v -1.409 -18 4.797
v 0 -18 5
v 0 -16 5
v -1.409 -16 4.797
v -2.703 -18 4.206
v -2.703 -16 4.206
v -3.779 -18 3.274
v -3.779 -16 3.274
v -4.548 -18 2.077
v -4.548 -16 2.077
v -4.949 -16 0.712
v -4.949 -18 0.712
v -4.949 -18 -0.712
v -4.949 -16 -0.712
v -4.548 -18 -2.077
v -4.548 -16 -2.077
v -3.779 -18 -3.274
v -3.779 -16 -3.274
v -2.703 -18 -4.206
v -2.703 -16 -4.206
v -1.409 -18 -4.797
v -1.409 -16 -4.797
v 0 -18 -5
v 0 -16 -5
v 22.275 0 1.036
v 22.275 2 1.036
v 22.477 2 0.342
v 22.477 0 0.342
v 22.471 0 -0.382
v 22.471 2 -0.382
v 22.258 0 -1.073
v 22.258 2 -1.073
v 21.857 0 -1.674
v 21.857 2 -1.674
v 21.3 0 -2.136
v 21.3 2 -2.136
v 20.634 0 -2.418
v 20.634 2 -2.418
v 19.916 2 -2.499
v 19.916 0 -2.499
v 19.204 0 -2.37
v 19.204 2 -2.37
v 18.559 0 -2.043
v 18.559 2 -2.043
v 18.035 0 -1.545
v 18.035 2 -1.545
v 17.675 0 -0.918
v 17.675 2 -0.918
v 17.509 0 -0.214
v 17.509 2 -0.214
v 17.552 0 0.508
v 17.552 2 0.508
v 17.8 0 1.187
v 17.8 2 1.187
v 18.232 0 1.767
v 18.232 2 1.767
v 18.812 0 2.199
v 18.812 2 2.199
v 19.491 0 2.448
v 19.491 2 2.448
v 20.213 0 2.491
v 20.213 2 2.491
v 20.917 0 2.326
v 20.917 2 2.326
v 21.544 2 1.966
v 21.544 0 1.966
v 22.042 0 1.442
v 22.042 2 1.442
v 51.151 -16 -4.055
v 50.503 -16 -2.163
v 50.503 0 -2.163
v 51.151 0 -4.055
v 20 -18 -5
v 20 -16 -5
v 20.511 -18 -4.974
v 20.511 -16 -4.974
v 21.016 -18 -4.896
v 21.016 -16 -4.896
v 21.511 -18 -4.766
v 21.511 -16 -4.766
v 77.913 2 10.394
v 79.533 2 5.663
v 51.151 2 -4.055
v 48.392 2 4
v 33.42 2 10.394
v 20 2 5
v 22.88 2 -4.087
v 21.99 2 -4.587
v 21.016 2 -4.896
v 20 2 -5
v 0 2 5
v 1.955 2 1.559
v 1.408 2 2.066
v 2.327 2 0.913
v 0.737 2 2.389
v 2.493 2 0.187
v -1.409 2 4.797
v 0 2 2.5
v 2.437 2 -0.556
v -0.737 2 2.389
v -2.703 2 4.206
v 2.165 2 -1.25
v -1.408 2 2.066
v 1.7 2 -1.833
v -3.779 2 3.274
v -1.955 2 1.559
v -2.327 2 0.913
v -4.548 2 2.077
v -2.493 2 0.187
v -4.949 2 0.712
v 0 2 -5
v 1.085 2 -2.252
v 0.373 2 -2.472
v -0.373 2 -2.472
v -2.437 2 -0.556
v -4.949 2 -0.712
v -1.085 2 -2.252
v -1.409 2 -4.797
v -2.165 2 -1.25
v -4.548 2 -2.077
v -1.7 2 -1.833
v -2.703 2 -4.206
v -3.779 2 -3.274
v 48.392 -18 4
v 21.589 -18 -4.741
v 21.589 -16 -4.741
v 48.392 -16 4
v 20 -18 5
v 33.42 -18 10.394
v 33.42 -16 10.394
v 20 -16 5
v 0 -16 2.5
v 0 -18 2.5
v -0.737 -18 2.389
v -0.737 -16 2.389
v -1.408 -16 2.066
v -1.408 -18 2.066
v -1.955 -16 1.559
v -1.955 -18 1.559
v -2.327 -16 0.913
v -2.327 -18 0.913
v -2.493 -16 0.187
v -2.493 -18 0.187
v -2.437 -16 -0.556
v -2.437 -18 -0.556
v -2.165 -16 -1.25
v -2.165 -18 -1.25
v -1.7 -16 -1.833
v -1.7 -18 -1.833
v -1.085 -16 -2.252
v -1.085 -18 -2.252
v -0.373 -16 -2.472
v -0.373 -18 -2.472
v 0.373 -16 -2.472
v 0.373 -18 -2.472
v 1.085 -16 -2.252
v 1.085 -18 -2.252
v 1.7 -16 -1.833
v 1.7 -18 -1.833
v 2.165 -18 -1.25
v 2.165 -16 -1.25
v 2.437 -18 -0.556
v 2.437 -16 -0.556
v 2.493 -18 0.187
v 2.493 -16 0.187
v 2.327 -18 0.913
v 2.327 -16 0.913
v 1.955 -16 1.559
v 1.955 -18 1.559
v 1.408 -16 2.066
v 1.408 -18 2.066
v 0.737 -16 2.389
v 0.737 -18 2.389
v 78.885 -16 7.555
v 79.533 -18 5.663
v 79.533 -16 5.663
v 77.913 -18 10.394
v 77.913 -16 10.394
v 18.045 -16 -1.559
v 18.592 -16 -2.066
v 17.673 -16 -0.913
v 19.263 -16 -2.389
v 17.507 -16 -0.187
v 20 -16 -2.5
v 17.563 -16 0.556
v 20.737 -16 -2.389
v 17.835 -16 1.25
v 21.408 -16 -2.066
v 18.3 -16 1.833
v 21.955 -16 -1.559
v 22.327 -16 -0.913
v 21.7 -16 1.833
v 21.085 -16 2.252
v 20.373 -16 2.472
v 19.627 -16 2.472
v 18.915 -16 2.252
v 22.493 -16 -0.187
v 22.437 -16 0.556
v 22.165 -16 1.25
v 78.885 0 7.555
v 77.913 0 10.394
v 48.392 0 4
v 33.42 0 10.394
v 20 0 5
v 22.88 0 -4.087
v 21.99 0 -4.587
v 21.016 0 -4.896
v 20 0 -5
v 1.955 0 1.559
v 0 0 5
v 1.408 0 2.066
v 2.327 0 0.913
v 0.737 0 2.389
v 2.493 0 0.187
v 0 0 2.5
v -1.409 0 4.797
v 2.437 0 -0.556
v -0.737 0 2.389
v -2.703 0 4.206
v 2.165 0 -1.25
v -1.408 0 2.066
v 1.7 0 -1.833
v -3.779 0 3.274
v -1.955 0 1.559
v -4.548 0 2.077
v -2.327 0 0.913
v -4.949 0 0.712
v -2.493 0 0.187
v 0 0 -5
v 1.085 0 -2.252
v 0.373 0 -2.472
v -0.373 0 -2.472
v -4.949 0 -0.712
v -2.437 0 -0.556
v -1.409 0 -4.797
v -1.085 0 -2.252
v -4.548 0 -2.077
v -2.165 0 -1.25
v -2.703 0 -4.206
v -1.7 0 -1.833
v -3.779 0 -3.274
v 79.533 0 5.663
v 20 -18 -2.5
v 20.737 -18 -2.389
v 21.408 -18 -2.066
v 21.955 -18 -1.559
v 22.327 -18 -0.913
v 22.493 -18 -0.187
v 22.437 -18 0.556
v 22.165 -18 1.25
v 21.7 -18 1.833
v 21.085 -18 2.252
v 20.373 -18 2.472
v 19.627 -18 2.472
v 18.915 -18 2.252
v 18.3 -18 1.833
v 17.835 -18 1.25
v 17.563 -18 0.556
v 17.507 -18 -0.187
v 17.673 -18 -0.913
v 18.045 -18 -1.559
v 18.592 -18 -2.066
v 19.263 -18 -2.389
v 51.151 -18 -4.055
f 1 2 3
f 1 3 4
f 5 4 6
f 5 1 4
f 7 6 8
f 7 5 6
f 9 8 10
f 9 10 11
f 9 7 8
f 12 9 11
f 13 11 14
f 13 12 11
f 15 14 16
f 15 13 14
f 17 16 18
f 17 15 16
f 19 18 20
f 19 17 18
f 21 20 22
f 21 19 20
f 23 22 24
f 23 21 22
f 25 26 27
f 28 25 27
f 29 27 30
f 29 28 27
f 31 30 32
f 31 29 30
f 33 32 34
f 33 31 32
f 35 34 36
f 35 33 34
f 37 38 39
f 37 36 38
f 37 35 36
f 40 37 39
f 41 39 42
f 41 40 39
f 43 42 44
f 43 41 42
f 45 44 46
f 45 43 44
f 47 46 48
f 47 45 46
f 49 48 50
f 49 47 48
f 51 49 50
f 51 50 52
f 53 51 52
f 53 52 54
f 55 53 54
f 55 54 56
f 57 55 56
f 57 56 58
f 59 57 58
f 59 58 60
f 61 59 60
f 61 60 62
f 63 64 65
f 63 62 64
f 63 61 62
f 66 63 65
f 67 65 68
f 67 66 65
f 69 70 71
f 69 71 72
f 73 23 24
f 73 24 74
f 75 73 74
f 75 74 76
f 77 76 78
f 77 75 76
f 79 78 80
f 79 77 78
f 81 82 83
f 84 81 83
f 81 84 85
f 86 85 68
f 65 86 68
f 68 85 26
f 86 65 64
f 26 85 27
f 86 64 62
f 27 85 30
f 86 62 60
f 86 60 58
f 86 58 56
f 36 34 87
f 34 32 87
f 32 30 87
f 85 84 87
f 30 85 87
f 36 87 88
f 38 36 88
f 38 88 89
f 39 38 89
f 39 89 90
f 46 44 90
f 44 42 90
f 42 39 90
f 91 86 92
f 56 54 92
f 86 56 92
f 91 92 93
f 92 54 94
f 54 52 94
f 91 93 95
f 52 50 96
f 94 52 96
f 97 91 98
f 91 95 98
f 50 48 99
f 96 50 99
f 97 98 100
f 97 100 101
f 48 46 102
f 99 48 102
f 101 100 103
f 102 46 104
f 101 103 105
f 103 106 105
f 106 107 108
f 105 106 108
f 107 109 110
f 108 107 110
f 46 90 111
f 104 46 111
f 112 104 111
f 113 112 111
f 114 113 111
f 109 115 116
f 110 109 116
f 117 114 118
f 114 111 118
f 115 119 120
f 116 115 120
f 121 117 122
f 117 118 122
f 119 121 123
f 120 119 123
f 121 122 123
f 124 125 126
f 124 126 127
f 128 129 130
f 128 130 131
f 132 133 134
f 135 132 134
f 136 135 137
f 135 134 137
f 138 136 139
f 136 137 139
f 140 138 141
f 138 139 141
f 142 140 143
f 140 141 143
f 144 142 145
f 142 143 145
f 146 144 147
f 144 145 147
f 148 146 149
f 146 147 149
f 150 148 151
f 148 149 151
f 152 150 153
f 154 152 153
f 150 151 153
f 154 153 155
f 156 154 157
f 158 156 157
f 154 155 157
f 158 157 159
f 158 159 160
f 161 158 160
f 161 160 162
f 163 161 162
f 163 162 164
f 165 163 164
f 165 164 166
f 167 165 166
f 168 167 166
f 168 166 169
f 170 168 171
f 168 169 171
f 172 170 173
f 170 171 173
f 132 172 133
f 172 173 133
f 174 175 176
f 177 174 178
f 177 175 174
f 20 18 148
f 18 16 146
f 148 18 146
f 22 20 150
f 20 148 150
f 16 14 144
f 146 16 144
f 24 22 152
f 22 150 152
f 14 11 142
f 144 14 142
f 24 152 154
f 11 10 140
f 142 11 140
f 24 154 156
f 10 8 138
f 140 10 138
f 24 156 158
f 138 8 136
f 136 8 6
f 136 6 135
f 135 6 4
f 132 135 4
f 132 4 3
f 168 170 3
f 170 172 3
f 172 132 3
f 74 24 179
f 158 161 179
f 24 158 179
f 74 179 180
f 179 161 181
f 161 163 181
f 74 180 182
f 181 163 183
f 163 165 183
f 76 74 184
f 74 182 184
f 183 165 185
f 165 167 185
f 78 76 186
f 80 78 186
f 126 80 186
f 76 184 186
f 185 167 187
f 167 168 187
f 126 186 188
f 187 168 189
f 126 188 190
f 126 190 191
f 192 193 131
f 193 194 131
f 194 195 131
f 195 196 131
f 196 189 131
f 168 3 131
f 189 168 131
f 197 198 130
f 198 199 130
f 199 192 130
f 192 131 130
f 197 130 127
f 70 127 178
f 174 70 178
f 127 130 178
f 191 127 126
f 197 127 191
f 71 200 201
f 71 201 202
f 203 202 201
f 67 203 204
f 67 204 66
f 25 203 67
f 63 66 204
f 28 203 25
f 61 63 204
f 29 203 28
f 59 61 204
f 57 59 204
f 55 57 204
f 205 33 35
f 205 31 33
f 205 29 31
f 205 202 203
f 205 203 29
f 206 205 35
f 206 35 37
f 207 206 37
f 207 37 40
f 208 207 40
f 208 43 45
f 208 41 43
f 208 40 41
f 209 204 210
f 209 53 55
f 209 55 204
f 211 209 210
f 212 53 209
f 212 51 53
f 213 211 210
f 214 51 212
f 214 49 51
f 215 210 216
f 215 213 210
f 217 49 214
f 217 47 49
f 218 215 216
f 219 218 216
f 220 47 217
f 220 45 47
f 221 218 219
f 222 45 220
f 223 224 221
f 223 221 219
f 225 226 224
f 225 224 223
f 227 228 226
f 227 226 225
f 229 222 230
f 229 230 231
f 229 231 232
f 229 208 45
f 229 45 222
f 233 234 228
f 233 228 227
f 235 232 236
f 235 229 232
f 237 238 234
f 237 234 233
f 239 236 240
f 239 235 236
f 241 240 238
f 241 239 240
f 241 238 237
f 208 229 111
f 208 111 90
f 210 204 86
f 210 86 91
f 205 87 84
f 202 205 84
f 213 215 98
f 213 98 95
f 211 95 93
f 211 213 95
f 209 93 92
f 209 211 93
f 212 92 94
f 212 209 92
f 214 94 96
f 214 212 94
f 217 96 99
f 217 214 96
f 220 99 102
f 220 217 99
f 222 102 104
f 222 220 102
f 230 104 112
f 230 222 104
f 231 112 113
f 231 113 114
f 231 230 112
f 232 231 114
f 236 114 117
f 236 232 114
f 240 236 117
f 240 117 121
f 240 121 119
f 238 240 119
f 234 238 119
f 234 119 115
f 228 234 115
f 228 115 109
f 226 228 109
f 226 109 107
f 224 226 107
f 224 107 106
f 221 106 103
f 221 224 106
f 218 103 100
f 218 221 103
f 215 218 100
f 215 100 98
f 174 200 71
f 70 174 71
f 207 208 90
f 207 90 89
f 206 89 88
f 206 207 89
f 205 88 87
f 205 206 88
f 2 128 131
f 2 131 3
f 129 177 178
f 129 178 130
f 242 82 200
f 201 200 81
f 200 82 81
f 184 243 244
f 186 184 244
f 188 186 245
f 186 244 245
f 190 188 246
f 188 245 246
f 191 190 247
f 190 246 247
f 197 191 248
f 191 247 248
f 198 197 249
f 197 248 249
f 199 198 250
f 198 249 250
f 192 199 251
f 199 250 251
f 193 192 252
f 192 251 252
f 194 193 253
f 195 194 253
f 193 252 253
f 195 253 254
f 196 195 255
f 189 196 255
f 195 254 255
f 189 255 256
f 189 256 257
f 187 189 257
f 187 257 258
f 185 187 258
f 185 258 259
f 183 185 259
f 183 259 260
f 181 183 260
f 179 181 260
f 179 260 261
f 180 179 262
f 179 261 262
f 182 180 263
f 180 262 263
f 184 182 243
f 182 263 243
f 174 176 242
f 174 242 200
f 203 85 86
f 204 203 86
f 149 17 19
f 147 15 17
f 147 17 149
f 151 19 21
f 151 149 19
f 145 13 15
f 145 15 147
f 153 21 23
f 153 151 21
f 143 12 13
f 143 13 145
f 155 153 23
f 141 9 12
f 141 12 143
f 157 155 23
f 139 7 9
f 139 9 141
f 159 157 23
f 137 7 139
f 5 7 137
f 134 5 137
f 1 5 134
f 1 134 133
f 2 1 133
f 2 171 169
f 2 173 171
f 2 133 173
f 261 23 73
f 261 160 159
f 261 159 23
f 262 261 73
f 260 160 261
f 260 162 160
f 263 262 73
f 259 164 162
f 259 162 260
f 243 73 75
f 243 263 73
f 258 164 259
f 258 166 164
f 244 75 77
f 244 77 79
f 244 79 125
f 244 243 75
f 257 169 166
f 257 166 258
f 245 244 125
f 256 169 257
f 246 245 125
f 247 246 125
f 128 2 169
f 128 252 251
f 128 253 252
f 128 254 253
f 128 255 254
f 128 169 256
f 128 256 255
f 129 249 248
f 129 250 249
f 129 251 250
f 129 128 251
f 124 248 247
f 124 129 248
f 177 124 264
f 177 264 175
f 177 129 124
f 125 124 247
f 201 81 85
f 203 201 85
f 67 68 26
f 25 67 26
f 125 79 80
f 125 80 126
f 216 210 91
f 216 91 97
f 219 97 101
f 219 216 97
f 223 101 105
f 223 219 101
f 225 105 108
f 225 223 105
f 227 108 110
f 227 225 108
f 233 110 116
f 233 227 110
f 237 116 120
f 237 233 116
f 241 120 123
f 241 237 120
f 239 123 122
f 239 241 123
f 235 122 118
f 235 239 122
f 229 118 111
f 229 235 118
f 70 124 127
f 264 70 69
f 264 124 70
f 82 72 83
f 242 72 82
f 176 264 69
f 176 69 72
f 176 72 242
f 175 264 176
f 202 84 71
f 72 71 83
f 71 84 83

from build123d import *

# Parameters (mm, degrees)
SKETCH1_R           = 2.5
BOSS_EXTRUDE1_DEPTH = 2
BOSS_EXTRUDE2_DEPTH = 2
BOSS_EXTRUDE3_DEPTH = 16
BOSS_EXTRUDE4_START = 2
SKETCH5_R           = 2.5
BOSS_EXTRUDE4_DEPTH = 2


with BuildPart() as part:
    # Sketch1 → Boss-Extrude1 (new body)
    with BuildSketch(Plane(origin=(0, 0, 0), x_dir=(1, 0, 0), z_dir=(0, 1, 0))):
        with BuildLine():
            Line((0, 5), (20, 5))
            ThreePointArc((20, 5), (25, 0), (20, -5))
            Line((20, -5), (0, -5))
            ThreePointArc((0, -5), (-5, 0), (0, 5))
        make_face()
        with Locations(Location((0, 0, 0), (0, 0, 270))):
            Circle(SKETCH1_R, mode=Mode.SUBTRACT)
        with Locations(Location((20, 0, 0), (0, 0, 270))):
            Circle(SKETCH1_R, mode=Mode.SUBTRACT)
    extrude(amount=BOSS_EXTRUDE1_DEPTH)

    # Sketch3 → Boss-Extrude2 (add)
    with BuildSketch(Plane(origin=(0, 2, 0), x_dir=(1, 0, 0), z_dir=(0, 1, 0))):
        Polygon((20, 5), (48.392339972, -4.000005434), (51.150724408, 4.055463463), (79.532873786, -5.663260562), (77.913086448, -10.393618791), (33.419519193, -10.393618791), (20, -5), (24.317409575, 2.521898999), align=None)
    extrude(amount=-BOSS_EXTRUDE2_DEPTH)

    # Sketch4 → Boss-Extrude3 (add)
    with BuildSketch(Plane.XZ):
        Polygon((51.150724408, -4.055463463), (79.532873786, 5.663260562), (78.884958851, 7.555403854), (50.502809473, -2.163320171), align=None)
    extrude(amount=BOSS_EXTRUDE3_DEPTH)

    # Sketch5 → Boss-Extrude4 (add)
    with BuildSketch(Plane.XZ.offset(16).offset(BOSS_EXTRUDE4_START)):
        with BuildLine():
            Line((48.392339972, 4.000005434), (51.150724408, -4.055463463))
            Line((51.150724408, -4.055463463), (79.532873786, 5.663260562))
            Line((79.532873786, 5.663260562), (77.913086448, 10.393618791))
            Line((77.913086448, 10.393618791), (33.419519193, 10.393618791))
            Line((33.419519193, 10.393618791), (20, 5))
            Line((20, 5), (0, 5))
            ThreePointArc((0, 5), (-5, 0), (0, -5))
            Line((0, -5), (20, -5))
            ThreePointArc((20, -5), (20.764409298, -4.941222361), (21.510846527, -4.76627137))
            Line((21.510846527, -4.76627137), (21.589436532, -4.740642521))
            Line((21.589436532, -4.740642521), (48.392339972, 4.000005434))
        make_face()
        with Locations(Location((0, 0, 0), (0, 0, 90))):
            Circle(SKETCH5_R, mode=Mode.SUBTRACT)
        with Locations(Location((20, 0, 0), (0, 0, 270))):
            Circle(SKETCH5_R, mode=Mode.SUBTRACT)
    extrude(amount=-BOSS_EXTRUDE4_DEPTH)


solid = part.part
